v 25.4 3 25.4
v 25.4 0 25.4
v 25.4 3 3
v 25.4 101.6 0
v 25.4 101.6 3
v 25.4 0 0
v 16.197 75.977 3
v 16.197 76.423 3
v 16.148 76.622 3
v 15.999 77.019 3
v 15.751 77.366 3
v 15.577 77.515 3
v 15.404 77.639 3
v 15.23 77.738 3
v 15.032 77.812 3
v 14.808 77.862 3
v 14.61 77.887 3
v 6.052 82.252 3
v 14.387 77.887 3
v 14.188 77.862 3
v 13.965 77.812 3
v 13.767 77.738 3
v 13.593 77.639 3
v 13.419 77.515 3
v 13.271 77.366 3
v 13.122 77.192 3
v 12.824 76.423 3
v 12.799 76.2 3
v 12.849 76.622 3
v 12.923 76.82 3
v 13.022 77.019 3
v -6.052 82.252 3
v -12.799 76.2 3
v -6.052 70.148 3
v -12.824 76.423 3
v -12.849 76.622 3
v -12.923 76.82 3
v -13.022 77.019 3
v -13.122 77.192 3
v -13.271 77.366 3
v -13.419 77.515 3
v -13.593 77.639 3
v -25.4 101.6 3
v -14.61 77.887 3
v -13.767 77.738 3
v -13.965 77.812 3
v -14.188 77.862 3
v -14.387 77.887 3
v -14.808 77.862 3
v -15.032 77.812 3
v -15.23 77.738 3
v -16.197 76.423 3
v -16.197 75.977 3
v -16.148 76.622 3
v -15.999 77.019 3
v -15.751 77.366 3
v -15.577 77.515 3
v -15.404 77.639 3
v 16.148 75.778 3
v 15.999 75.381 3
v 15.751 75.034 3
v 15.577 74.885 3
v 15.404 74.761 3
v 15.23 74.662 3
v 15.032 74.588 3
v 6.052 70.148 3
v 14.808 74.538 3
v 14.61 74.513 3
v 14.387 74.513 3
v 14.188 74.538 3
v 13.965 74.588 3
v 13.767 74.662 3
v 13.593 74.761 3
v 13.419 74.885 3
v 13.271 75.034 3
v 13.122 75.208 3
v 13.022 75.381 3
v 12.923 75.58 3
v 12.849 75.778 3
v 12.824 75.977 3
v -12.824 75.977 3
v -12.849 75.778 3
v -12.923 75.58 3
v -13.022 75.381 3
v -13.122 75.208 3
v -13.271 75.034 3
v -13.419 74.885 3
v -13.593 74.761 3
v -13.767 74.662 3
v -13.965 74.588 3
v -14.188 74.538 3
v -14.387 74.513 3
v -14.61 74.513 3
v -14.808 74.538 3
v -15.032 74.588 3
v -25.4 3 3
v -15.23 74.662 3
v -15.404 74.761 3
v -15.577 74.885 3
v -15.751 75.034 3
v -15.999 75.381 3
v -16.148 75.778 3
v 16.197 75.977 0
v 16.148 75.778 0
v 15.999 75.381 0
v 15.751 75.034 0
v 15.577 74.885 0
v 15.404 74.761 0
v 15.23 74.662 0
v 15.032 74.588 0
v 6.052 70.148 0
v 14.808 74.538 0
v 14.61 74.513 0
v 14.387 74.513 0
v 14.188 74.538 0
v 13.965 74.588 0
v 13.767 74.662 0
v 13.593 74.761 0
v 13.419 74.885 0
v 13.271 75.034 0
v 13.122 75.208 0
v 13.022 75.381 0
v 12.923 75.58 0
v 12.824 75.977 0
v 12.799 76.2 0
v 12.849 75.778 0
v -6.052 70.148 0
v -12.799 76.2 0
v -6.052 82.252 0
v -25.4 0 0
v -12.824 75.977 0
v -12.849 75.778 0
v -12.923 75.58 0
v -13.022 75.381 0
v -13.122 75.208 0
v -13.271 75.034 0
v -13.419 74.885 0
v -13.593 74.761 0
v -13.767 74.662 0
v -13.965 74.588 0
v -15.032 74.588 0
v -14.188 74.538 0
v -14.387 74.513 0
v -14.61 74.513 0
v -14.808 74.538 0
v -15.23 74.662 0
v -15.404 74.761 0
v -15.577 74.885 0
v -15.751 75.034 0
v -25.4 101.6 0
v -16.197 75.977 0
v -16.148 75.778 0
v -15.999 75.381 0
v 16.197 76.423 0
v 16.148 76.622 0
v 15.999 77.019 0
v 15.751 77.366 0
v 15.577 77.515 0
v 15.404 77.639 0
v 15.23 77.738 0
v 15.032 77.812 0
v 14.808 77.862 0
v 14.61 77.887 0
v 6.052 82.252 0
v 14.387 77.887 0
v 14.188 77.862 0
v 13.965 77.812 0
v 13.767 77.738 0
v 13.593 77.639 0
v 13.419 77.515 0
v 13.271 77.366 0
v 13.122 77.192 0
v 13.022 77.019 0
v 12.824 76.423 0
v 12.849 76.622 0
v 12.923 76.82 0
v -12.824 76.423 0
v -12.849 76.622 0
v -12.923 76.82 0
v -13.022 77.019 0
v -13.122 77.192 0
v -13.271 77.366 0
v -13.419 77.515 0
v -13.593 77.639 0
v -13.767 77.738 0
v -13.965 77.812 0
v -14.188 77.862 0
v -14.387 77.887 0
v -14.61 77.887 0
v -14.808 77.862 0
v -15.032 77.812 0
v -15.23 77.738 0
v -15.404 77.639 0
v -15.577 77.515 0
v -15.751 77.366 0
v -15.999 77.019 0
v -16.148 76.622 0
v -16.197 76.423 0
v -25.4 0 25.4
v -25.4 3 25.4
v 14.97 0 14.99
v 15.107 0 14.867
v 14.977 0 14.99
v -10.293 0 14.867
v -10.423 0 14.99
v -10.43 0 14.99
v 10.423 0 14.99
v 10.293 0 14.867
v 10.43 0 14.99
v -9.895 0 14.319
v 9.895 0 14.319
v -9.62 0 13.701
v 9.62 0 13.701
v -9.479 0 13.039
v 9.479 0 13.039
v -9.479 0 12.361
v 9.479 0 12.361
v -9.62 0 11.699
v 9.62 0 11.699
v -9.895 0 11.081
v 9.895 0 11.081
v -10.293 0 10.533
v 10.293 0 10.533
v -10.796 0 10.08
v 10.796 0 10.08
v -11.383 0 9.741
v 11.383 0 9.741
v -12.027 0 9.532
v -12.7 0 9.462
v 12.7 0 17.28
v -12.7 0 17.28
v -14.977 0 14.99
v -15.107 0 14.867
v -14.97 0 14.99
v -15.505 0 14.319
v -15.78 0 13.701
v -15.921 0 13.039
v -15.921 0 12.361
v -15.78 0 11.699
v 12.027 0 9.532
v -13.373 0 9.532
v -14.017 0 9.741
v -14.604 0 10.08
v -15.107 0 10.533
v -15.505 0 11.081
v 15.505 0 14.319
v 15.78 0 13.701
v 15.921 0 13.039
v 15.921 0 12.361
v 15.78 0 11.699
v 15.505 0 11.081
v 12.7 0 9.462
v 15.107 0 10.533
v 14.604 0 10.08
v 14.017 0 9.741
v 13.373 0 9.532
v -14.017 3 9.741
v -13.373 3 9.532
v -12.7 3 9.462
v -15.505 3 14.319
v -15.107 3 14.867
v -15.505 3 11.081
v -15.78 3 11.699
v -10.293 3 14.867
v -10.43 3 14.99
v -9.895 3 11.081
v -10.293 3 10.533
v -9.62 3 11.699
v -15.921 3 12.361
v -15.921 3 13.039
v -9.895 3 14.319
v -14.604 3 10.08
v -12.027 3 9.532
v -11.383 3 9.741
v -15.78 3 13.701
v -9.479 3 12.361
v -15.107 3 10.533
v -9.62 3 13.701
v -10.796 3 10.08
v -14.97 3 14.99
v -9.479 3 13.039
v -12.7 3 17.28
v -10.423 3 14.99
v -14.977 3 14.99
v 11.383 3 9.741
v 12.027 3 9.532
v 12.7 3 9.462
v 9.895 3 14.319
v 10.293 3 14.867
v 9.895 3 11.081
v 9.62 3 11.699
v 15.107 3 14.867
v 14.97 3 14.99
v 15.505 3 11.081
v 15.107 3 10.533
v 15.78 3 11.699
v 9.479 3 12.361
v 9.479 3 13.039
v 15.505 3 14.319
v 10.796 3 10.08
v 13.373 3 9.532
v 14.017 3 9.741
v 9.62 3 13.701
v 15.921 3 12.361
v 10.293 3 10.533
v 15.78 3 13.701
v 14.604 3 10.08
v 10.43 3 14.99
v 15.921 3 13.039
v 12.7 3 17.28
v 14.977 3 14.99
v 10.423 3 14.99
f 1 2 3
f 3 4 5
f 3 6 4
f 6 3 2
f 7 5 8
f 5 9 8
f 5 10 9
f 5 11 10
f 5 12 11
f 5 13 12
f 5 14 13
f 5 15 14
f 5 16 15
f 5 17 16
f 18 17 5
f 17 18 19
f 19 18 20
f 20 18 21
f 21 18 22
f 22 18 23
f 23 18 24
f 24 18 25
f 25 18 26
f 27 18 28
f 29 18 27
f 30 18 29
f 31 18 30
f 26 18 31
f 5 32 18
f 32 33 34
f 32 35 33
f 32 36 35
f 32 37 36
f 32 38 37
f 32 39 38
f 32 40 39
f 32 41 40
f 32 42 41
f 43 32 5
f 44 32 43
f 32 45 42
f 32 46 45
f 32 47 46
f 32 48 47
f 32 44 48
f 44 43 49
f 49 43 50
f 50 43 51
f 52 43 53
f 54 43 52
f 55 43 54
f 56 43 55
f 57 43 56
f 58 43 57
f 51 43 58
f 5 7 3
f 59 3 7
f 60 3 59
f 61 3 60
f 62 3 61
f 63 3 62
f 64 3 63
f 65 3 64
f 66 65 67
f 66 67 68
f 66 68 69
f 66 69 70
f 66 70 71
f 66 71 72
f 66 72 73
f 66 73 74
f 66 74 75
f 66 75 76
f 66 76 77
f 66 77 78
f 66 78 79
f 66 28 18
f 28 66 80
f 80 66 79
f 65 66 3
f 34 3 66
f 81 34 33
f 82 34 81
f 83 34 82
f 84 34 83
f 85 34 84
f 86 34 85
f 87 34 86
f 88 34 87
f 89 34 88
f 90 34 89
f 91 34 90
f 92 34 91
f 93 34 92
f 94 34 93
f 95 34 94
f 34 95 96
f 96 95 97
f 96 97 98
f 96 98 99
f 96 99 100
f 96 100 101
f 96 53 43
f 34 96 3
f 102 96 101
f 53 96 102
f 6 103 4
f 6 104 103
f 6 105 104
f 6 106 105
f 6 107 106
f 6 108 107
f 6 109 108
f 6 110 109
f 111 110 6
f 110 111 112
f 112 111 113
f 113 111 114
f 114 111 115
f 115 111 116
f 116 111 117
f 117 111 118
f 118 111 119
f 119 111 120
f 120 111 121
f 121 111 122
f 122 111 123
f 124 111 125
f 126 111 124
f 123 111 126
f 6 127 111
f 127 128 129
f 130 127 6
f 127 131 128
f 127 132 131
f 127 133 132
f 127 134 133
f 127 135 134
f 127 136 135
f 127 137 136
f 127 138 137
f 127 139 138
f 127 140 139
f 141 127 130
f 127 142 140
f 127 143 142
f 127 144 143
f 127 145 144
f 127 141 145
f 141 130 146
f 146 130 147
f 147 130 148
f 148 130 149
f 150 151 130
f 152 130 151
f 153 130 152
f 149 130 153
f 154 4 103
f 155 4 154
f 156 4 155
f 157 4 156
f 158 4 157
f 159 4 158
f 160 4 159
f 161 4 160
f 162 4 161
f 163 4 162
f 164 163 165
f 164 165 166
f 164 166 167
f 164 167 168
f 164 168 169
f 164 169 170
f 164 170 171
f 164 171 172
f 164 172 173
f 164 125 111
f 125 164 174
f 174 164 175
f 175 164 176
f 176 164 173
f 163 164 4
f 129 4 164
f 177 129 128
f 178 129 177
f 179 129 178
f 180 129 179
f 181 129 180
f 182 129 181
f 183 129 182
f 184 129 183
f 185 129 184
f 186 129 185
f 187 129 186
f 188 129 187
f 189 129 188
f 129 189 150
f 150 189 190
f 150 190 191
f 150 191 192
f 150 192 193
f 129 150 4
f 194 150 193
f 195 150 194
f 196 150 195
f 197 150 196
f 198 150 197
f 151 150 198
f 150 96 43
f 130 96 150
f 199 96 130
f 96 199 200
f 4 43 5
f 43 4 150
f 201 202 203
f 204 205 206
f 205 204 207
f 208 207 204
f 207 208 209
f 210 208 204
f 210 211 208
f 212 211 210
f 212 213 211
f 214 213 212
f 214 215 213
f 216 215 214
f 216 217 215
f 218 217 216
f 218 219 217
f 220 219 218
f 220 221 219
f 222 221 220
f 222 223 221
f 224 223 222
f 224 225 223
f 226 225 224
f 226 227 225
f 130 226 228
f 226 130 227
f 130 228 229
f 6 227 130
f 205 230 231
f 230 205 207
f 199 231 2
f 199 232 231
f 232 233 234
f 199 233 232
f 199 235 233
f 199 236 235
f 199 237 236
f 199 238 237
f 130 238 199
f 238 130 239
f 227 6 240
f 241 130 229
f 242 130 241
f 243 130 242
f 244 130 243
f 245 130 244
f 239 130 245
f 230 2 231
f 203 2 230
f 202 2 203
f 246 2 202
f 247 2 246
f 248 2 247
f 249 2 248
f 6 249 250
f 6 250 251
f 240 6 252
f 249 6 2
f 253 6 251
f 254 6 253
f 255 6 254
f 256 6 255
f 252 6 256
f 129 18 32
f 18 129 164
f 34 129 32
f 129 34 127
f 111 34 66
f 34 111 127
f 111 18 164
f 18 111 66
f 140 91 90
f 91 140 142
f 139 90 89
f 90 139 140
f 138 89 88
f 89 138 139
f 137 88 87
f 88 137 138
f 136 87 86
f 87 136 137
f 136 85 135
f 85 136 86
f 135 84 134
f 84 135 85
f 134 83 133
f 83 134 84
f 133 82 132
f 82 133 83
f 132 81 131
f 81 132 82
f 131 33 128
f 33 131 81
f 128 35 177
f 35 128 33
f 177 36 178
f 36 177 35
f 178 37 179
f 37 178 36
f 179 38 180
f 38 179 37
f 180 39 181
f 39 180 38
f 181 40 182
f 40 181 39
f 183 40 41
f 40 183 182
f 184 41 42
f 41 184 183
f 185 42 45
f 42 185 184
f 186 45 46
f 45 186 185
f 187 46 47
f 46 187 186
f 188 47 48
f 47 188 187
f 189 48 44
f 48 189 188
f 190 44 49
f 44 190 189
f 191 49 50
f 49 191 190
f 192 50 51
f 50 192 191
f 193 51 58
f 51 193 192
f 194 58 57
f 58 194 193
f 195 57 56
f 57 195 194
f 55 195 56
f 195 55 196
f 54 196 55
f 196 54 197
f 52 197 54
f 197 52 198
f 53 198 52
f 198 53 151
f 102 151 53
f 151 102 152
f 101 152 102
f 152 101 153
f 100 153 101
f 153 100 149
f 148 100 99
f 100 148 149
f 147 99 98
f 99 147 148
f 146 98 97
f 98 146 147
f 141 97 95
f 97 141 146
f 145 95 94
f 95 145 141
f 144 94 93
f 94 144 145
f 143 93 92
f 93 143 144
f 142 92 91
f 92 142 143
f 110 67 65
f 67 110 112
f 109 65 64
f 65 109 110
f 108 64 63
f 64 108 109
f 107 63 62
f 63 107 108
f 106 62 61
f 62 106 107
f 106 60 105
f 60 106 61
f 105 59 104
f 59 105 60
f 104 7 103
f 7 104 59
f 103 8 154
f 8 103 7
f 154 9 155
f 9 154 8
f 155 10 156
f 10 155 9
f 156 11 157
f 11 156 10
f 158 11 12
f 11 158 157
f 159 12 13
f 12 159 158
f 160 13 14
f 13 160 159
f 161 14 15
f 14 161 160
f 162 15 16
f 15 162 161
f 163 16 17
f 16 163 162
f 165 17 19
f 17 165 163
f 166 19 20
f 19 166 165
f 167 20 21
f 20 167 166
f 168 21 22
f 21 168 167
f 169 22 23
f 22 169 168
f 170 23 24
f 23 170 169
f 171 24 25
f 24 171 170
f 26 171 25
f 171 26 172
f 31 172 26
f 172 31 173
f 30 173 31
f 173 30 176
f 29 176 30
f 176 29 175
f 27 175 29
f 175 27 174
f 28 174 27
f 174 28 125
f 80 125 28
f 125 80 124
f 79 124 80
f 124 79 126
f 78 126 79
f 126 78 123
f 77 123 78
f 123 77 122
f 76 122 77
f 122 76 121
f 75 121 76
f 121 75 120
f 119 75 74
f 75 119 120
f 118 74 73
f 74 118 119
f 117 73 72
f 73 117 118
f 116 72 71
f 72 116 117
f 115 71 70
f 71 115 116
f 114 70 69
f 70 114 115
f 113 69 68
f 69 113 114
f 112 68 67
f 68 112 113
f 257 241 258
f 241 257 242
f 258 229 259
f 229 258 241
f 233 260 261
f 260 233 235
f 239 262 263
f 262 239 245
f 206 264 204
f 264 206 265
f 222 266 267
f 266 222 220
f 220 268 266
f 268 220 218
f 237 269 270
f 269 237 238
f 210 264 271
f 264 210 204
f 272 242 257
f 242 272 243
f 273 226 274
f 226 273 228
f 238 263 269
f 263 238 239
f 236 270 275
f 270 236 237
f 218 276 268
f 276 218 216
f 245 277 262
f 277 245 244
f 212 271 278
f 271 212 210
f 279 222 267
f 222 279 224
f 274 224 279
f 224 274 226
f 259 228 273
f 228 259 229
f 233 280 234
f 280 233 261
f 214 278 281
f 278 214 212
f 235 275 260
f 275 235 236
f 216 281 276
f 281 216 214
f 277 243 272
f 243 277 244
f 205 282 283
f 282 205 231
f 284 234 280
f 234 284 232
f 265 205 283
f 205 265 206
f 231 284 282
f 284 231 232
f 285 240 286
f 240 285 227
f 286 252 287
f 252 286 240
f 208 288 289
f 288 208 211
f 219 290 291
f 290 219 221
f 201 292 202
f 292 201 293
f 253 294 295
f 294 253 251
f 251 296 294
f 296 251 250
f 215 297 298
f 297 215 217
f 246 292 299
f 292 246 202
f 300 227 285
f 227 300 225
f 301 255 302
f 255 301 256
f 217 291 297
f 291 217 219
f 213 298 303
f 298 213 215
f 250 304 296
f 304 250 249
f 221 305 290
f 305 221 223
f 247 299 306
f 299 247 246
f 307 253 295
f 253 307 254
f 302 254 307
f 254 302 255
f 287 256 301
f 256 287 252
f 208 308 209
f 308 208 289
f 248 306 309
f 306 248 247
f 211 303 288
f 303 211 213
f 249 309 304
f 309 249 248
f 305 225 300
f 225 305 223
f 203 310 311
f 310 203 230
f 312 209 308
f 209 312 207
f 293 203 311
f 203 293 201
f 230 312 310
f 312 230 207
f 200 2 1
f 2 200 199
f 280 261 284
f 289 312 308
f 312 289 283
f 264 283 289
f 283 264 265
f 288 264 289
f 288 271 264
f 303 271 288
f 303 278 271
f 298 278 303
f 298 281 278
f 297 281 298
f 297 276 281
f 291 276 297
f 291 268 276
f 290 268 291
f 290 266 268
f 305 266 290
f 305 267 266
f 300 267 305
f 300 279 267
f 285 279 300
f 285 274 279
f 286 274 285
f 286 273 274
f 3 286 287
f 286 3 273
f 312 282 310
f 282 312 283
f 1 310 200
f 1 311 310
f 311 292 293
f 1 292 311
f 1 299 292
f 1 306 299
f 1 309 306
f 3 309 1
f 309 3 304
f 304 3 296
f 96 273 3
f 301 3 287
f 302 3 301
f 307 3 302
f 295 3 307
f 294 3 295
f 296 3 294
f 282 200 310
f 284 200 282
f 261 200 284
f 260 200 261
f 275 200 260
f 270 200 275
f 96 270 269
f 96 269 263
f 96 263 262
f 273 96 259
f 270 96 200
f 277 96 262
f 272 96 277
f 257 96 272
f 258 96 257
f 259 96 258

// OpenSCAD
use <MCAD/teardrop.scad>

$fn=50;
inch = 25.4;

module myhole() {
  rotate([0, 0, 90]) {
    teardrop(radius=0.255*inch/2, length=20, angle=90);
  }
}


difference() {
    
translate([-1*inch,0,0])
cube([2*inch, 4*inch, 3]);
    
linear_extrude(6)
scale([inch, inch, 0])
translate([0,3,-3])
import("./cutout.dxf");


}

difference() {

translate([-1*inch, 0, 0]) 
cube([2*inch, 3, 1*inch]);

union() {
   
translate([-0.5*inch, 0, 0.5*inch])
myhole();
    
translate([0.5*inch, 0, 0.5*inch])
myhole();

}
}
